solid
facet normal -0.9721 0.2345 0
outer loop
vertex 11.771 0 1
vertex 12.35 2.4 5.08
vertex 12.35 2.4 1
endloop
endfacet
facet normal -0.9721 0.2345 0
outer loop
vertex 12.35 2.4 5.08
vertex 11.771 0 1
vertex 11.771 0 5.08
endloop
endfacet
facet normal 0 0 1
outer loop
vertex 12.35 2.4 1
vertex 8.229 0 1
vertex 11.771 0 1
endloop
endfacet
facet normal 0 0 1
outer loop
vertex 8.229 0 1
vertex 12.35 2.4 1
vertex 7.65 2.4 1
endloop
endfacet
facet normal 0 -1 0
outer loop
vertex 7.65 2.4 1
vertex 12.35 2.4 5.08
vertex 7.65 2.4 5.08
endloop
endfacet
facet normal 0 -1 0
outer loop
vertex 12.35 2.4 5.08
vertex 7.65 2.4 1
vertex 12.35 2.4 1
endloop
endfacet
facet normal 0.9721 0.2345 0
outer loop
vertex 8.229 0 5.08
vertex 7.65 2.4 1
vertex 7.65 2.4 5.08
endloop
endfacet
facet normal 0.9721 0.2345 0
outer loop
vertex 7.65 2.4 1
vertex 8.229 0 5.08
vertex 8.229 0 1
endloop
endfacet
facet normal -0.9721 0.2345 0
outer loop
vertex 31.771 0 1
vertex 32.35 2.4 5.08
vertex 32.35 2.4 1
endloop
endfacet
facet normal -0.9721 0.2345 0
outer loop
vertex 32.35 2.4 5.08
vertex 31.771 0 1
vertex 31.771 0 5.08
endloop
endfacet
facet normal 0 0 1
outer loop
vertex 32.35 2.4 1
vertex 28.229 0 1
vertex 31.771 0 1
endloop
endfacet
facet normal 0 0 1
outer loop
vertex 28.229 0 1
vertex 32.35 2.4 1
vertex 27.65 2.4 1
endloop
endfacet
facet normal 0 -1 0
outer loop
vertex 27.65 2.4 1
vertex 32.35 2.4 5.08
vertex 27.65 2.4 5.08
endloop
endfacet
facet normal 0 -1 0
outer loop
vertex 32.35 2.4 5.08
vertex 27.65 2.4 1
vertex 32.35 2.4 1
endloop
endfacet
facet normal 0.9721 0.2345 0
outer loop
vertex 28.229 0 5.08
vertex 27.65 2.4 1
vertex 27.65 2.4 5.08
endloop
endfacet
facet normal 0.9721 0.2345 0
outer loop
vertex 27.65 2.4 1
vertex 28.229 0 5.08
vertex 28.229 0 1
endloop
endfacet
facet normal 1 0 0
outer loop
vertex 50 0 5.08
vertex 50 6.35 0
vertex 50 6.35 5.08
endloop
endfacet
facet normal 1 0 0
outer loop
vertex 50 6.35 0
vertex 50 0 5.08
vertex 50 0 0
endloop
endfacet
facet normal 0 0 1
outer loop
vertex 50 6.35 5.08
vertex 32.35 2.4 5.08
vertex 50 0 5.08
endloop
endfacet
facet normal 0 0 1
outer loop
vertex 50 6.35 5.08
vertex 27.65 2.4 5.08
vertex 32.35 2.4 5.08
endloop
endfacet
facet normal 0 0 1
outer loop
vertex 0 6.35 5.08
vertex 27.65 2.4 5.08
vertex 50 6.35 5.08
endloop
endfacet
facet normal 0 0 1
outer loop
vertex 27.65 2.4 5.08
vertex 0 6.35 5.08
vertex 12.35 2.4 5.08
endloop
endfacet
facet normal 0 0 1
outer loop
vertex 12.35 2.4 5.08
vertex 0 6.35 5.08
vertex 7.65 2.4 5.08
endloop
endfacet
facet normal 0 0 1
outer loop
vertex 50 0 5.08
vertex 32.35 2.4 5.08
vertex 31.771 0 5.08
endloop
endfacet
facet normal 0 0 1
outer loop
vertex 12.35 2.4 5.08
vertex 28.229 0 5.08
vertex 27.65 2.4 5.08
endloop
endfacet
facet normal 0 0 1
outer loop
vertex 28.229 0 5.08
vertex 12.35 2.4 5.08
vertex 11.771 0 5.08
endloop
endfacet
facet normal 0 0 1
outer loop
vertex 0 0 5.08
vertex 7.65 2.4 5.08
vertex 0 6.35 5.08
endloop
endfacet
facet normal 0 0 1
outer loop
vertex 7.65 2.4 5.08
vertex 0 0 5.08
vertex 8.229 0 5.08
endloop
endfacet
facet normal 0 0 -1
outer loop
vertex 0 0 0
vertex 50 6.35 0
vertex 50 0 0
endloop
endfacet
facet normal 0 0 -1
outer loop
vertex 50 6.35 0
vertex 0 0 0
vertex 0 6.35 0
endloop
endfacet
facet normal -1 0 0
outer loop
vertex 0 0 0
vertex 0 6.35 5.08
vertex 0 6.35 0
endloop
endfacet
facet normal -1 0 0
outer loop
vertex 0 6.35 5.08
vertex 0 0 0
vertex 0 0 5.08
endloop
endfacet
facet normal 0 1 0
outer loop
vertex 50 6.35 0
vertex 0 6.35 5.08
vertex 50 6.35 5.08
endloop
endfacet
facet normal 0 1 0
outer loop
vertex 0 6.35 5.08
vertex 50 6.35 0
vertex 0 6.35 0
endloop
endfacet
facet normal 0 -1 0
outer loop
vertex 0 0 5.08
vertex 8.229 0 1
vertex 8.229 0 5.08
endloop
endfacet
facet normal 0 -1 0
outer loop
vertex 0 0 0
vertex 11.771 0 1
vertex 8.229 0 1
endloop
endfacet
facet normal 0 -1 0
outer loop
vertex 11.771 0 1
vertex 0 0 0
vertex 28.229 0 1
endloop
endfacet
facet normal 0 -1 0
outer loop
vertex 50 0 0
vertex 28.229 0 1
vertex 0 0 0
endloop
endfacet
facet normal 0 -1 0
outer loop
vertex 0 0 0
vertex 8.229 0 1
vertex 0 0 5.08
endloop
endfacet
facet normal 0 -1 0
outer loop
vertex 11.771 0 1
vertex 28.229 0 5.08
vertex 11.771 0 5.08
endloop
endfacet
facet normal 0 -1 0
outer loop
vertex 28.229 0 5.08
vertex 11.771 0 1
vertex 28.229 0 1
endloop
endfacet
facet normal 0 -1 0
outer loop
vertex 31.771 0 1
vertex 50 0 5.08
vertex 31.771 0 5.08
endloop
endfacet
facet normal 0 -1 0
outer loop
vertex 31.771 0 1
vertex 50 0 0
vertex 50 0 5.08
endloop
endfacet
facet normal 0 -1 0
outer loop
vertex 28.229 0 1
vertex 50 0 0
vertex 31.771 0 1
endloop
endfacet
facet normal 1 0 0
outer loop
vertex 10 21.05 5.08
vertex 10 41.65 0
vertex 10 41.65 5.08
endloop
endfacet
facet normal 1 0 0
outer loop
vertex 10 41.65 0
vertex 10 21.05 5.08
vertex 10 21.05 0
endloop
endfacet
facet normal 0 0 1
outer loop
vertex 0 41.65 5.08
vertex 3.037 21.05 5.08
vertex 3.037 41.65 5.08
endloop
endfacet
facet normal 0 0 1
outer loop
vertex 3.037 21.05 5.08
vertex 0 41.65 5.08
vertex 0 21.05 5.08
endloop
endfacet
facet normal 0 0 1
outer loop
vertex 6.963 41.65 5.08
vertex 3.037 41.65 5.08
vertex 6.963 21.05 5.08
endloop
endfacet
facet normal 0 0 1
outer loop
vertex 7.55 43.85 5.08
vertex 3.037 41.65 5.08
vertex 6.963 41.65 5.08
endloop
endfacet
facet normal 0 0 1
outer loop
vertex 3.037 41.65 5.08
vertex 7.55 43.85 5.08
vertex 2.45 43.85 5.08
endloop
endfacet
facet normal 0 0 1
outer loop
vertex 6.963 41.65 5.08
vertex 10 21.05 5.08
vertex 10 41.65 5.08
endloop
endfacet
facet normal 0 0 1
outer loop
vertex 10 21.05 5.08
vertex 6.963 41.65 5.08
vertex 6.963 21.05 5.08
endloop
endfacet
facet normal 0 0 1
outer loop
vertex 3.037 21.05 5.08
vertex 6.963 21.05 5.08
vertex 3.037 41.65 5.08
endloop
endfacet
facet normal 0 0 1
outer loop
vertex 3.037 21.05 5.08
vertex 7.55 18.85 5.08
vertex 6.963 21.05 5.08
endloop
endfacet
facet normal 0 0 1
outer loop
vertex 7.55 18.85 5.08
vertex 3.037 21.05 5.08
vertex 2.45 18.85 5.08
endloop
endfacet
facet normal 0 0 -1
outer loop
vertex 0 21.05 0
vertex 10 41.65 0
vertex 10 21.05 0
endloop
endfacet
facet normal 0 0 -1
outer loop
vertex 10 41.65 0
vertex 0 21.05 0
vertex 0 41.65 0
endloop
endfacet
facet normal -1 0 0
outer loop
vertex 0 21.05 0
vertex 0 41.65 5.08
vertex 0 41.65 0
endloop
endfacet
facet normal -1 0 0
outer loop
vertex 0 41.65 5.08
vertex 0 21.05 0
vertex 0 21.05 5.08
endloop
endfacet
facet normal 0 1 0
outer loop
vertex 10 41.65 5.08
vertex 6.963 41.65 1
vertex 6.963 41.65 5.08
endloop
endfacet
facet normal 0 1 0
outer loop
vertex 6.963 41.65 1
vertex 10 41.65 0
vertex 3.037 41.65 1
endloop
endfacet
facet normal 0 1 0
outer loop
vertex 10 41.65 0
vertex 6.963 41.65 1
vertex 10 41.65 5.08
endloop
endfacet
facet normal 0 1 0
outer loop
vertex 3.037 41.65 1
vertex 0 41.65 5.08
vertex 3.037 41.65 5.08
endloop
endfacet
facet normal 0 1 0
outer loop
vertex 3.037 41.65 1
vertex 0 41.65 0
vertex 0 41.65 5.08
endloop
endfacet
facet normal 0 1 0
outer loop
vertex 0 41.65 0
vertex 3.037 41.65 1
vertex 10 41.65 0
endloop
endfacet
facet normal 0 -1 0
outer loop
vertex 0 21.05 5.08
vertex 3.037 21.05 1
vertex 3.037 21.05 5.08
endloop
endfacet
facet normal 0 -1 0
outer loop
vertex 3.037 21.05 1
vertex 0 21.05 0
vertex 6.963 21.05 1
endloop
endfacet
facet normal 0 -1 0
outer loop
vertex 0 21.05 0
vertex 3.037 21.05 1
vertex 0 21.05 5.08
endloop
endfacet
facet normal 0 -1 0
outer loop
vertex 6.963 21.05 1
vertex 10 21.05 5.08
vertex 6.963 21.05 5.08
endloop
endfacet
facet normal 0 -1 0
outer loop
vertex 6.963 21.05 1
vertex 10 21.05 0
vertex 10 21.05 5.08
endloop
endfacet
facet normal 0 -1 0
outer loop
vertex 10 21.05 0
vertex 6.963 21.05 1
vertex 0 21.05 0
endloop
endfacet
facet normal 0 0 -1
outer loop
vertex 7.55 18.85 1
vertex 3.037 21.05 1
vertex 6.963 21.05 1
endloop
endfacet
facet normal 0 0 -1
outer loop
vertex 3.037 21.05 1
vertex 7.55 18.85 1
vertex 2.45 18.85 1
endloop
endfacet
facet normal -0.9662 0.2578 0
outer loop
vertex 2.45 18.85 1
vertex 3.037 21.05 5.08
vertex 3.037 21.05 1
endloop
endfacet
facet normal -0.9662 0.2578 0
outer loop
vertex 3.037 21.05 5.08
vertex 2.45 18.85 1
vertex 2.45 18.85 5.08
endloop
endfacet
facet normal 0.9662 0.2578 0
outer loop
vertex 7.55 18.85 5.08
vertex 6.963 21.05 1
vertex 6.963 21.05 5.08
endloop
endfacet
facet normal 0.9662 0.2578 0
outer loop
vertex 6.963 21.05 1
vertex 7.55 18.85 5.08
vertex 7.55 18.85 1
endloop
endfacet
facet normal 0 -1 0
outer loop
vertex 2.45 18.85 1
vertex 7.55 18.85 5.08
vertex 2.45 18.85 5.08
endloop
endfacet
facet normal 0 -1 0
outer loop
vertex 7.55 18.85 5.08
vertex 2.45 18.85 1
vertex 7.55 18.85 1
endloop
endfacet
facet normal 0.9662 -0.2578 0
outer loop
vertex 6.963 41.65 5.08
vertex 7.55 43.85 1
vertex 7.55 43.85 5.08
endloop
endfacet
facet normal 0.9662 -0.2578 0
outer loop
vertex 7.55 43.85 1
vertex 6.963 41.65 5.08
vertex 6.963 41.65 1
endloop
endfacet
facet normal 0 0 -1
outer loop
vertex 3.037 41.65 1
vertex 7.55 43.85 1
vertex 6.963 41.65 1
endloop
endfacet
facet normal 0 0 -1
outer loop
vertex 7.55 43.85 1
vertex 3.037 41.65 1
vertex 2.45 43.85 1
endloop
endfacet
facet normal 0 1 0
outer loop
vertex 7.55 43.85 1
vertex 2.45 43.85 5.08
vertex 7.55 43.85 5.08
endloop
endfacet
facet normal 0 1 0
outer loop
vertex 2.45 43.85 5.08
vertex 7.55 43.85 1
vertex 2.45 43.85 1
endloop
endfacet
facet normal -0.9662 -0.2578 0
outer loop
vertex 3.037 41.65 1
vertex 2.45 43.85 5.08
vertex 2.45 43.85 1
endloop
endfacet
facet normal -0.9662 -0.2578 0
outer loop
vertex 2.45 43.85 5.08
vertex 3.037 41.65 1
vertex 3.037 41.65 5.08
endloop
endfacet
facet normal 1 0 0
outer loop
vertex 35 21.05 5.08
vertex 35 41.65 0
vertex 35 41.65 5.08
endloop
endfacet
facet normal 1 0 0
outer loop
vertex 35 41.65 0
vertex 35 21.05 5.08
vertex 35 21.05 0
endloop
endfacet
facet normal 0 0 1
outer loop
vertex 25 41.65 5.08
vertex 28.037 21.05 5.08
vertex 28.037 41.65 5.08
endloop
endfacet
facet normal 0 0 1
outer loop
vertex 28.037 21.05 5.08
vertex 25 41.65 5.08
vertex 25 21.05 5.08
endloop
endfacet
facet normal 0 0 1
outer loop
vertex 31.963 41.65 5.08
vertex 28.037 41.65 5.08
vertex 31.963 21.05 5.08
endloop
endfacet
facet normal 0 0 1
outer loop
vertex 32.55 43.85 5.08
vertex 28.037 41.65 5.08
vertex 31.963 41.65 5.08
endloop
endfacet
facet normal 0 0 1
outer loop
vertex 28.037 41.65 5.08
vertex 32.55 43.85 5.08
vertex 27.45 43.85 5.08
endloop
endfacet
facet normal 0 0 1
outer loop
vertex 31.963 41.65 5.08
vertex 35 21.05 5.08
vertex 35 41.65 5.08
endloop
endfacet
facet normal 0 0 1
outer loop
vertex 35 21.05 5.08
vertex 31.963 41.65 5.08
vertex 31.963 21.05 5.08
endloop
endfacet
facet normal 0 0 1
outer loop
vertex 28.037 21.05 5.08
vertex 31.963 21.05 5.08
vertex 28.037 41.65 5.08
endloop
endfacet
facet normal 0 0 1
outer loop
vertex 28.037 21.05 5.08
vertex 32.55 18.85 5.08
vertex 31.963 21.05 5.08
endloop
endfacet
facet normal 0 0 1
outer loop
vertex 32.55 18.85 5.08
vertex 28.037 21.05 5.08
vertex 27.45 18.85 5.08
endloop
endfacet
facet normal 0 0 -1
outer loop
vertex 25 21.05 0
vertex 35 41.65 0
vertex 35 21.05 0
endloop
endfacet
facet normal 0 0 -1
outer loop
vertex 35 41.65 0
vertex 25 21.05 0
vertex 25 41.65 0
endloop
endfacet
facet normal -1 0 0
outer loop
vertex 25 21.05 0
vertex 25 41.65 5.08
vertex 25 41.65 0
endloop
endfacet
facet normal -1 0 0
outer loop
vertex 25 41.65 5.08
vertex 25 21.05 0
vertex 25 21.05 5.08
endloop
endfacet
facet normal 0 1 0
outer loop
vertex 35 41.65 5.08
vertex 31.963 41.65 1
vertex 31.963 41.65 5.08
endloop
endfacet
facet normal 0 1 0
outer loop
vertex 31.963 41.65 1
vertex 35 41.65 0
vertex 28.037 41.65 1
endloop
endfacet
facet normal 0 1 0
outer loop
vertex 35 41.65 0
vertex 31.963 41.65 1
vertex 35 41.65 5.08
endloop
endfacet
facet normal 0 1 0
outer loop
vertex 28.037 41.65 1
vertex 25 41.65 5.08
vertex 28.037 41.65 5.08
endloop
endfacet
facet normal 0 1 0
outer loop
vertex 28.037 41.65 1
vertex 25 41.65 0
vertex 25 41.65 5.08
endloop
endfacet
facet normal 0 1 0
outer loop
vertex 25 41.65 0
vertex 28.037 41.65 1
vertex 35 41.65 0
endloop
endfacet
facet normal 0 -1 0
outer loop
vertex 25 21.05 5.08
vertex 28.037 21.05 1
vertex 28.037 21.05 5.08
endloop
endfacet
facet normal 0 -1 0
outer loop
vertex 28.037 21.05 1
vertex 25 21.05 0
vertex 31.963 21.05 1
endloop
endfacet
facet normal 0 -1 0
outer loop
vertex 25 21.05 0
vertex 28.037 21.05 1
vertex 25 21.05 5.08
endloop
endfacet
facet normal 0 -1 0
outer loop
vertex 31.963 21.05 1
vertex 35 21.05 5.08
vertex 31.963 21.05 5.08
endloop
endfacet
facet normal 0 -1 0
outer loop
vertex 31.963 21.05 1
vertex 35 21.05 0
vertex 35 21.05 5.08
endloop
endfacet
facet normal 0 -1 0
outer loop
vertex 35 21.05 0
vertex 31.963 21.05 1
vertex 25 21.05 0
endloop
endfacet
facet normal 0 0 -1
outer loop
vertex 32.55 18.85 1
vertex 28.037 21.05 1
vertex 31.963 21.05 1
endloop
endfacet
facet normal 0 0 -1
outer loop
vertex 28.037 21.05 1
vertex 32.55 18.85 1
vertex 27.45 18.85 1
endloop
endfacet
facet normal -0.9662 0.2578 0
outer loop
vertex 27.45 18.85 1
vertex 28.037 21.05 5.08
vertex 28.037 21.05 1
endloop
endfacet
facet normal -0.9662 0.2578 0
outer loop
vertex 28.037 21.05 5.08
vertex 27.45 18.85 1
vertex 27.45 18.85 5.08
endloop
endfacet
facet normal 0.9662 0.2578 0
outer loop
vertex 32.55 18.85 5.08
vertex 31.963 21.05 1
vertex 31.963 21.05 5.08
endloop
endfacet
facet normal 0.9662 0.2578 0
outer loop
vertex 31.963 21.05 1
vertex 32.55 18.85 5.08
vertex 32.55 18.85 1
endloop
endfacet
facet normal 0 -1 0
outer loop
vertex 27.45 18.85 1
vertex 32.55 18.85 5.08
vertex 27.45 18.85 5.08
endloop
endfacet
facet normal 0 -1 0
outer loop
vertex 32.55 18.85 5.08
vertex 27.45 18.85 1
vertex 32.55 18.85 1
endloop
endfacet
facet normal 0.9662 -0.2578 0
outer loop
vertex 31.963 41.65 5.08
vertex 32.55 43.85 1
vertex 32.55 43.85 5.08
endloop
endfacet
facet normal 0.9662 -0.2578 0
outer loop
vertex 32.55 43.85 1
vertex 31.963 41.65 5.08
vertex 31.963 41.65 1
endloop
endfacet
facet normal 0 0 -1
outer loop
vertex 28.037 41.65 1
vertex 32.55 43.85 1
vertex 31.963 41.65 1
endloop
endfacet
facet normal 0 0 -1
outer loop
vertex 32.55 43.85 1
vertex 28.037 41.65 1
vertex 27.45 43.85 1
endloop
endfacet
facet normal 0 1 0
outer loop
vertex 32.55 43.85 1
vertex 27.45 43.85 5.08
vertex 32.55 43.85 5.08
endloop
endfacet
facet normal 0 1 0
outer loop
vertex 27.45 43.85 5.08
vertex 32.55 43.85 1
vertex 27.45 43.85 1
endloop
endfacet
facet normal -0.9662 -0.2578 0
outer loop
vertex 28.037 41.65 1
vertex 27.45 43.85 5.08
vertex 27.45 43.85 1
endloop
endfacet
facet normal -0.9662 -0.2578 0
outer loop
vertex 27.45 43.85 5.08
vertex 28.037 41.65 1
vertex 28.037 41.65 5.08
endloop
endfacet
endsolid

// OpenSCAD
// file: model-forge/model-forge/joint.scad
// model-forge/joint.scad — dovetail finger-joint tabs for snap-fit panel
// segmentation. One segment gets protruding tabs (union onto its edge),
// the matching segment gets slightly-larger slots (difference cut into
// its edge) so the two press together with a light interference/snap fit.
//
// Both modules produce a 2D profile running along the X axis, centered
// on the boundary line (y=0), for a boundary of the given edge_length.
// The caller extrudes and positions/rotates it onto the actual seam
// (see back-wall-joint-test.scad for a worked example on a vertical seam).
//
//   use <model-forge/joint.scad>
//   linear_extrude(height=thickness)
//     dovetail_tabs_2d(edge_length=60, tab_width=15, tab_depth=6, taper=2);
//   // on the MATING piece, subtract:
//   linear_extrude(height=thickness+2)
//     dovetail_tabs_2d(edge_length=60, tab_width=15, tab_depth=6, taper=2, clearance=0.15);

module dovetail_tab_2d(tab_width, tab_depth, taper, base_overlap = 0.5) {
  // Trapezoid: narrow at the base, wider at the tip (y=tab_depth) — the
  // taper is what makes it a dovetail (can't pull straight out sideways
  // once the mating slot is filled) and gives the snap/interference feel
  // as it's pressed in along Y. The base extends base_overlap PAST y=0
  // (the seam line) on purpose: a cut/union placed exactly flush with a
  // piece's boundary face (zero overlap) is a classic OpenSCAD/CGAL
  // gotcha — coincident faces produce degenerate, non-manifold results
  // (confirmed here: without the overlap this rendered as a distorted
  // sliver instead of a clean notch). The overlap guarantees real overlap
  // for both the union (tab) and difference (slot) uses.
  polygon(points = [
    [-tab_width / 2, -base_overlap],
    [tab_width / 2, -base_overlap],
    [tab_width / 2 + taper, tab_depth],
    [-tab_width / 2 - taper, tab_depth],
  ]);
}

/**
 * A row of dovetail tabs spanning edge_length, evenly spaced and centered,
 * each tab_width wide with tab_depth of protrusion and the given taper.
 * Pass clearance > 0 (e.g. 0.15-0.2mm) when using this as a SLOT cutout on
 * the mating piece, so the tab has just enough room to press in.
 */
module dovetail_tabs_2d(edge_length, tab_width, tab_depth, taper, clearance = 0) {
  // Growing the slot via offset(delta=clearance) produced a disconnected
  // sliver fragment at the corner (confirmed with --render: 3 volumes
  // instead of 2, a known OpenSCAD quirk with delta-mode offset on a
  // trapezoid). Scaling the tab's own dimensions directly instead avoids
  // offset() entirely and renders as the expected 2 volumes.
  pitch = tab_width * 2;
  n = max(1, floor(edge_length / pitch));
  row_width = n * pitch - tab_width;
  start_x = -row_width / 2;
  for (i = [0 : n - 1]) {
    translate([start_x + i * pitch, 0])
      dovetail_tab_2d(tab_width + 2 * clearance, tab_depth + clearance, taper + clearance);
  }
}
// file: model-forge/rack.scad
// model-forge/rack.scad — oven-rack-style construction: individual bars
// that dovetail into mortise slots on a rail, instead of one molded
// panel. Replaces the "cut a monolithic grate in half" approach: that
// either avoids the bars entirely (leaving only 2 tiny joints holding
// the whole panel together — a weak load path) or requires a shallow
// in-plane tab carved into a thin panel edge (limited by the panel's
// own thin cross-section). A real oven rack is built this way for a
// reason: each bar's FULL cross-section becomes the tenon, engaging the
// rail through its whole thickness — much stronger than a shallow edge
// tab, and the load is distributed across every bar instead of 2 points.
//
// Tenon defaults are the validated small-scale dovetail from
// dovetail-fit-test-small.scad (tab_width=3.5, tab_depth=2.5, taper=0.8)
// at clearance=-0.1mm — the winning value from a real print test
// (-0.15 held but needed a mallet and risked overstressing the joint;
// -0.1 was solid without excessive force).
use <model-forge/joint.scad> // dovetail_tab_2d

DEFAULT_TENON_WIDTH = 3.5;
DEFAULT_TENON_DEPTH = 2.5;
DEFAULT_TENON_TAPER = 0.8;
DEFAULT_CLEARANCE   = -0.1;
// A blind pocket instead of a through-slot: leaves this much solid
// material at the BOTTOM of the mortise (z=0 to floor_thickness) so a
// bar's tenon has a real seat to rest against instead of being able to
// slide all the way through with no positive stop. User: "the middle
// can actually have a small base layer under the rail so that the edge
// rails can hold the dovetail piece without allowing it to fall
// through -- even a 1mm... would work well." Set to 0 for the old
// through-slot behavior.
DEFAULT_FLOOR_THICKNESS = 1;

// A single bar spanning `span`, with a tenon on each end (at y=0,
// pointing further -Y, and at y=span, pointing further +Y). The tenon
// itself is shortened to (thickness - floor_thickness) and lifted to
// start at z=floor_thickness, so its bottom face lands exactly on the
// rail's mortise floor instead of continuing past it.
//
// eps: the bar's own base cube overlaps span by eps on each end so it
// genuinely penetrates into the rail's solid volume, not just touches
// it flush. dovetail_tab_2d's own base_overlap already handles this for
// the tenon itself, but the FLAT part of the bar's end face (the width
// outside the tenon) was still landing exactly coincident with the
// rail's flat face -- confirmed via a non-manifold-edge check (trimesh
// found them at exactly y=rail_width and y=rail_width+span, everywhere
// except the tenon). Same class of bug as tray.scad's lip eps and
// joint.scad's tab base_overlap.
module rack_bar(
  span,
  bar_width,
  thickness,
  tenon_width     = DEFAULT_TENON_WIDTH,
  tenon_depth     = DEFAULT_TENON_DEPTH,
  tenon_taper     = DEFAULT_TENON_TAPER,
  floor_thickness = DEFAULT_FLOOR_THICKNESS
) {
  eps = 0.3;
  tenon_h = thickness - floor_thickness;
  union() {
    translate([0, -eps, 0])
      cube([bar_width, span + 2 * eps, thickness]);
    translate([bar_width / 2, 0, floor_thickness])
      rotate([0, 0, 180])
        linear_extrude(height = tenon_h)
          dovetail_tab_2d(tenon_width, tenon_depth, tenon_taper);
    translate([bar_width / 2, span, floor_thickness])
      linear_extrude(height = tenon_h)
        dovetail_tab_2d(tenon_width, tenon_depth, tenon_taper);
  }
}

// A straight rail with n_bars evenly-spaced mortise slots along its
// y=0 edge, cutting +Y into rail_width. Each slot is a blind pocket
// (see floor_thickness above), not a through-cut. Mirror this piece
// (mirror([0,1,0]) then translate) to use it as the opposite-facing
// rail in an assembly — the slot pattern is symmetric, only the facing
// direction changes.
module rack_rail(
  length,
  rail_width,
  thickness,
  n_bars,
  bar_pitch,
  first_offset,
  tenon_width     = DEFAULT_TENON_WIDTH,
  tenon_depth     = DEFAULT_TENON_DEPTH,
  tenon_taper     = DEFAULT_TENON_TAPER,
  clearance       = DEFAULT_CLEARANCE,
  floor_thickness = DEFAULT_FLOOR_THICKNESS
) {
  difference() {
    cube([length, rail_width, thickness]);
    for (i = [0 : n_bars - 1])
      translate([first_offset + i * bar_pitch, 0, floor_thickness])
        linear_extrude(height = thickness - floor_thickness + 1)
          dovetail_tab_2d(
            tenon_width + 2 * clearance,
            tenon_depth + clearance,
            tenon_taper + clearance
          );
  }
}

// 2D wing profile: flat on the LEFT edge (x=0, where it joins a bar's
// own body), rounded on the RIGHT edge (the outer, x=width side).
// Built as a hull of two near-zero-radius points pinning the flat left
// edge and two real-radius circles rounding the right edge — same
// hull-of-circles technique as tray.scad's rounded_rect_2d.
//
// fillet_r must stay <= width/2, or the fillet circles (centered at
// width-fillet_r) bulge past x=0 and the "flat" edge disappears —
// confirmed: fillet_r=5 on width=6.35 put the circle center only
// 1.35mm from the edge with a 5mm radius, extending to x=-3.65 instead
// of stopping at x=0.
module edge_wing_2d(width, height, fillet_r) {
  hull() {
    translate([0, 0]) circle(r = 0.01, $fn = 8);
    translate([0, height]) circle(r = 0.01, $fn = 8);
    translate([width - fillet_r, fillet_r]) circle(r = fillet_r, $fn = 32);
    translate([width - fillet_r, height - fillet_r]) circle(r = fillet_r, $fn = 32);
  }
}

// An edge bar: identical tenon mechanism to rack_bar (dovetails into
// the SAME rail mortises, at the SAME pitch position as any other bar)
// but wider — extended out to the frame's true outer edge with a
// rounded outer corner, plus the lip flange for docking into the oven
// cavity's support rail. Replaces a separate perpendicular side-rail
// piece entirely: "why are you separating the side ones from the rail
// next to it -- we have 14 normal rails and 2 side rails with a nice
// rounded taper." No new joint type — same dovetail-into-mortise
// mechanism as every other bar, just a wider body on the outer end.
//
// wing_width: how far the wing extends beyond the bar's own bar_width
// (normally = frame_width_mm, reaching exactly to the true frame edge).
// Mirror this module (mirror([1,0,0]) after translating to the bar's
// own local origin) to build the RIGHT-side edge bar from the same code.
module rack_edge_bar(
  span,
  bar_width,
  thickness,
  wing_width,
  fillet_r,
  lip_width       = 0,
  lip_thickness   = 0,
  tenon_width     = DEFAULT_TENON_WIDTH,
  tenon_depth     = DEFAULT_TENON_DEPTH,
  tenon_taper     = DEFAULT_TENON_TAPER,
  floor_thickness = DEFAULT_FLOOR_THICKNESS
) {
  eps = 0.3; // same coincident-face overlap as rack_bar's own base cube
  union() {
    rack_bar(span, bar_width, thickness, tenon_width, tenon_depth, tenon_taper, floor_thickness);
    // Wing overlaps eps into the bar's own core (positive x) instead of
    // stopping exactly flush at x=0 -- same class of bug as the
    // bar/rail coincident face fixed earlier.
    //
    // Bug fixed 2026-09-13: mirroring the 2D profile BEFORE
    // linear_extrude (mirror([1,0]) on edge_wing_2d itself) inverts the
    // polygon winding -- the resulting solid was watertight on its own
    // but with is_winding_consistent=False and NEGATIVE volume. Unioned
    // with the bar's normal-winding solid, this silently produced a
    // mesh missing the wing entirely (confirmed: OpenSCAD's own "mesh
    // is not closed" warning, and the exported STL had no wing
    // geometry at all). Fix: mirror the 3D solid AFTER extrusion
    // instead, which OpenSCAD's dedicated 3D mirror handles correctly.
    translate([eps, 0, 0])
      mirror([1, 0, 0])
        linear_extrude(height = thickness)
          edge_wing_2d(wing_width, span, fillet_r);
    if (lip_width > 0 && lip_thickness > 0)
      translate([-wing_width - lip_width + eps, 0, thickness - lip_thickness])
        cube([lip_width, span, lip_thickness]);
  }
}
// main file
// Tiny Land oven grate v2 — rack-construction proof piece.
//
// Bug fixed 2026-09-13: the first version union()'d the rail and bars
// together in OpenSCAD, so it printed as one pre-fused solid -- there
// was nothing left to actually test, since the joint was assembled in
// software instead of by hand. Same mistake class as the sealed test
// comb from 2026-09-12: a "test" only tests something if the pieces
// print SEPARATE and get assembled for real.
//
// Now prints 3 separate objects: one rail (2 slots) and two bars (each
// with a tenon on both ends). Press a bar's tenon into a rail slot by
// hand to actually test the -0.1mm fit before scaling to the real
// 16-bar, full-length grate.
use <model-forge/rack.scad>

rail_length   = 50;
rail_width    = 6.35; // matches the grate's frame_width
thickness     = 5.08; // matches the grate's own thickness
bar_width     = 10;   // matches the grate's own bar_width
span          = 20;   // short test span — the real grate's bars are ~216mm
n_bars        = 2;
bar_pitch     = 20;
first_offset  = 10;

// The rail — slots open on its y=0 edge (rack_rail's natural
// orientation), so a bar's tenon presses straight in from above.
rack_rail(rail_length, rail_width, thickness, n_bars, bar_pitch, first_offset);

// Two separate bars, laid out beside the rail with clear gaps.
translate([0, rail_width + 15, 0])
  rack_bar(span, bar_width, thickness);

translate([bar_width + 15, rail_width + 15, 0])
  rack_bar(span, bar_width, thickness);
